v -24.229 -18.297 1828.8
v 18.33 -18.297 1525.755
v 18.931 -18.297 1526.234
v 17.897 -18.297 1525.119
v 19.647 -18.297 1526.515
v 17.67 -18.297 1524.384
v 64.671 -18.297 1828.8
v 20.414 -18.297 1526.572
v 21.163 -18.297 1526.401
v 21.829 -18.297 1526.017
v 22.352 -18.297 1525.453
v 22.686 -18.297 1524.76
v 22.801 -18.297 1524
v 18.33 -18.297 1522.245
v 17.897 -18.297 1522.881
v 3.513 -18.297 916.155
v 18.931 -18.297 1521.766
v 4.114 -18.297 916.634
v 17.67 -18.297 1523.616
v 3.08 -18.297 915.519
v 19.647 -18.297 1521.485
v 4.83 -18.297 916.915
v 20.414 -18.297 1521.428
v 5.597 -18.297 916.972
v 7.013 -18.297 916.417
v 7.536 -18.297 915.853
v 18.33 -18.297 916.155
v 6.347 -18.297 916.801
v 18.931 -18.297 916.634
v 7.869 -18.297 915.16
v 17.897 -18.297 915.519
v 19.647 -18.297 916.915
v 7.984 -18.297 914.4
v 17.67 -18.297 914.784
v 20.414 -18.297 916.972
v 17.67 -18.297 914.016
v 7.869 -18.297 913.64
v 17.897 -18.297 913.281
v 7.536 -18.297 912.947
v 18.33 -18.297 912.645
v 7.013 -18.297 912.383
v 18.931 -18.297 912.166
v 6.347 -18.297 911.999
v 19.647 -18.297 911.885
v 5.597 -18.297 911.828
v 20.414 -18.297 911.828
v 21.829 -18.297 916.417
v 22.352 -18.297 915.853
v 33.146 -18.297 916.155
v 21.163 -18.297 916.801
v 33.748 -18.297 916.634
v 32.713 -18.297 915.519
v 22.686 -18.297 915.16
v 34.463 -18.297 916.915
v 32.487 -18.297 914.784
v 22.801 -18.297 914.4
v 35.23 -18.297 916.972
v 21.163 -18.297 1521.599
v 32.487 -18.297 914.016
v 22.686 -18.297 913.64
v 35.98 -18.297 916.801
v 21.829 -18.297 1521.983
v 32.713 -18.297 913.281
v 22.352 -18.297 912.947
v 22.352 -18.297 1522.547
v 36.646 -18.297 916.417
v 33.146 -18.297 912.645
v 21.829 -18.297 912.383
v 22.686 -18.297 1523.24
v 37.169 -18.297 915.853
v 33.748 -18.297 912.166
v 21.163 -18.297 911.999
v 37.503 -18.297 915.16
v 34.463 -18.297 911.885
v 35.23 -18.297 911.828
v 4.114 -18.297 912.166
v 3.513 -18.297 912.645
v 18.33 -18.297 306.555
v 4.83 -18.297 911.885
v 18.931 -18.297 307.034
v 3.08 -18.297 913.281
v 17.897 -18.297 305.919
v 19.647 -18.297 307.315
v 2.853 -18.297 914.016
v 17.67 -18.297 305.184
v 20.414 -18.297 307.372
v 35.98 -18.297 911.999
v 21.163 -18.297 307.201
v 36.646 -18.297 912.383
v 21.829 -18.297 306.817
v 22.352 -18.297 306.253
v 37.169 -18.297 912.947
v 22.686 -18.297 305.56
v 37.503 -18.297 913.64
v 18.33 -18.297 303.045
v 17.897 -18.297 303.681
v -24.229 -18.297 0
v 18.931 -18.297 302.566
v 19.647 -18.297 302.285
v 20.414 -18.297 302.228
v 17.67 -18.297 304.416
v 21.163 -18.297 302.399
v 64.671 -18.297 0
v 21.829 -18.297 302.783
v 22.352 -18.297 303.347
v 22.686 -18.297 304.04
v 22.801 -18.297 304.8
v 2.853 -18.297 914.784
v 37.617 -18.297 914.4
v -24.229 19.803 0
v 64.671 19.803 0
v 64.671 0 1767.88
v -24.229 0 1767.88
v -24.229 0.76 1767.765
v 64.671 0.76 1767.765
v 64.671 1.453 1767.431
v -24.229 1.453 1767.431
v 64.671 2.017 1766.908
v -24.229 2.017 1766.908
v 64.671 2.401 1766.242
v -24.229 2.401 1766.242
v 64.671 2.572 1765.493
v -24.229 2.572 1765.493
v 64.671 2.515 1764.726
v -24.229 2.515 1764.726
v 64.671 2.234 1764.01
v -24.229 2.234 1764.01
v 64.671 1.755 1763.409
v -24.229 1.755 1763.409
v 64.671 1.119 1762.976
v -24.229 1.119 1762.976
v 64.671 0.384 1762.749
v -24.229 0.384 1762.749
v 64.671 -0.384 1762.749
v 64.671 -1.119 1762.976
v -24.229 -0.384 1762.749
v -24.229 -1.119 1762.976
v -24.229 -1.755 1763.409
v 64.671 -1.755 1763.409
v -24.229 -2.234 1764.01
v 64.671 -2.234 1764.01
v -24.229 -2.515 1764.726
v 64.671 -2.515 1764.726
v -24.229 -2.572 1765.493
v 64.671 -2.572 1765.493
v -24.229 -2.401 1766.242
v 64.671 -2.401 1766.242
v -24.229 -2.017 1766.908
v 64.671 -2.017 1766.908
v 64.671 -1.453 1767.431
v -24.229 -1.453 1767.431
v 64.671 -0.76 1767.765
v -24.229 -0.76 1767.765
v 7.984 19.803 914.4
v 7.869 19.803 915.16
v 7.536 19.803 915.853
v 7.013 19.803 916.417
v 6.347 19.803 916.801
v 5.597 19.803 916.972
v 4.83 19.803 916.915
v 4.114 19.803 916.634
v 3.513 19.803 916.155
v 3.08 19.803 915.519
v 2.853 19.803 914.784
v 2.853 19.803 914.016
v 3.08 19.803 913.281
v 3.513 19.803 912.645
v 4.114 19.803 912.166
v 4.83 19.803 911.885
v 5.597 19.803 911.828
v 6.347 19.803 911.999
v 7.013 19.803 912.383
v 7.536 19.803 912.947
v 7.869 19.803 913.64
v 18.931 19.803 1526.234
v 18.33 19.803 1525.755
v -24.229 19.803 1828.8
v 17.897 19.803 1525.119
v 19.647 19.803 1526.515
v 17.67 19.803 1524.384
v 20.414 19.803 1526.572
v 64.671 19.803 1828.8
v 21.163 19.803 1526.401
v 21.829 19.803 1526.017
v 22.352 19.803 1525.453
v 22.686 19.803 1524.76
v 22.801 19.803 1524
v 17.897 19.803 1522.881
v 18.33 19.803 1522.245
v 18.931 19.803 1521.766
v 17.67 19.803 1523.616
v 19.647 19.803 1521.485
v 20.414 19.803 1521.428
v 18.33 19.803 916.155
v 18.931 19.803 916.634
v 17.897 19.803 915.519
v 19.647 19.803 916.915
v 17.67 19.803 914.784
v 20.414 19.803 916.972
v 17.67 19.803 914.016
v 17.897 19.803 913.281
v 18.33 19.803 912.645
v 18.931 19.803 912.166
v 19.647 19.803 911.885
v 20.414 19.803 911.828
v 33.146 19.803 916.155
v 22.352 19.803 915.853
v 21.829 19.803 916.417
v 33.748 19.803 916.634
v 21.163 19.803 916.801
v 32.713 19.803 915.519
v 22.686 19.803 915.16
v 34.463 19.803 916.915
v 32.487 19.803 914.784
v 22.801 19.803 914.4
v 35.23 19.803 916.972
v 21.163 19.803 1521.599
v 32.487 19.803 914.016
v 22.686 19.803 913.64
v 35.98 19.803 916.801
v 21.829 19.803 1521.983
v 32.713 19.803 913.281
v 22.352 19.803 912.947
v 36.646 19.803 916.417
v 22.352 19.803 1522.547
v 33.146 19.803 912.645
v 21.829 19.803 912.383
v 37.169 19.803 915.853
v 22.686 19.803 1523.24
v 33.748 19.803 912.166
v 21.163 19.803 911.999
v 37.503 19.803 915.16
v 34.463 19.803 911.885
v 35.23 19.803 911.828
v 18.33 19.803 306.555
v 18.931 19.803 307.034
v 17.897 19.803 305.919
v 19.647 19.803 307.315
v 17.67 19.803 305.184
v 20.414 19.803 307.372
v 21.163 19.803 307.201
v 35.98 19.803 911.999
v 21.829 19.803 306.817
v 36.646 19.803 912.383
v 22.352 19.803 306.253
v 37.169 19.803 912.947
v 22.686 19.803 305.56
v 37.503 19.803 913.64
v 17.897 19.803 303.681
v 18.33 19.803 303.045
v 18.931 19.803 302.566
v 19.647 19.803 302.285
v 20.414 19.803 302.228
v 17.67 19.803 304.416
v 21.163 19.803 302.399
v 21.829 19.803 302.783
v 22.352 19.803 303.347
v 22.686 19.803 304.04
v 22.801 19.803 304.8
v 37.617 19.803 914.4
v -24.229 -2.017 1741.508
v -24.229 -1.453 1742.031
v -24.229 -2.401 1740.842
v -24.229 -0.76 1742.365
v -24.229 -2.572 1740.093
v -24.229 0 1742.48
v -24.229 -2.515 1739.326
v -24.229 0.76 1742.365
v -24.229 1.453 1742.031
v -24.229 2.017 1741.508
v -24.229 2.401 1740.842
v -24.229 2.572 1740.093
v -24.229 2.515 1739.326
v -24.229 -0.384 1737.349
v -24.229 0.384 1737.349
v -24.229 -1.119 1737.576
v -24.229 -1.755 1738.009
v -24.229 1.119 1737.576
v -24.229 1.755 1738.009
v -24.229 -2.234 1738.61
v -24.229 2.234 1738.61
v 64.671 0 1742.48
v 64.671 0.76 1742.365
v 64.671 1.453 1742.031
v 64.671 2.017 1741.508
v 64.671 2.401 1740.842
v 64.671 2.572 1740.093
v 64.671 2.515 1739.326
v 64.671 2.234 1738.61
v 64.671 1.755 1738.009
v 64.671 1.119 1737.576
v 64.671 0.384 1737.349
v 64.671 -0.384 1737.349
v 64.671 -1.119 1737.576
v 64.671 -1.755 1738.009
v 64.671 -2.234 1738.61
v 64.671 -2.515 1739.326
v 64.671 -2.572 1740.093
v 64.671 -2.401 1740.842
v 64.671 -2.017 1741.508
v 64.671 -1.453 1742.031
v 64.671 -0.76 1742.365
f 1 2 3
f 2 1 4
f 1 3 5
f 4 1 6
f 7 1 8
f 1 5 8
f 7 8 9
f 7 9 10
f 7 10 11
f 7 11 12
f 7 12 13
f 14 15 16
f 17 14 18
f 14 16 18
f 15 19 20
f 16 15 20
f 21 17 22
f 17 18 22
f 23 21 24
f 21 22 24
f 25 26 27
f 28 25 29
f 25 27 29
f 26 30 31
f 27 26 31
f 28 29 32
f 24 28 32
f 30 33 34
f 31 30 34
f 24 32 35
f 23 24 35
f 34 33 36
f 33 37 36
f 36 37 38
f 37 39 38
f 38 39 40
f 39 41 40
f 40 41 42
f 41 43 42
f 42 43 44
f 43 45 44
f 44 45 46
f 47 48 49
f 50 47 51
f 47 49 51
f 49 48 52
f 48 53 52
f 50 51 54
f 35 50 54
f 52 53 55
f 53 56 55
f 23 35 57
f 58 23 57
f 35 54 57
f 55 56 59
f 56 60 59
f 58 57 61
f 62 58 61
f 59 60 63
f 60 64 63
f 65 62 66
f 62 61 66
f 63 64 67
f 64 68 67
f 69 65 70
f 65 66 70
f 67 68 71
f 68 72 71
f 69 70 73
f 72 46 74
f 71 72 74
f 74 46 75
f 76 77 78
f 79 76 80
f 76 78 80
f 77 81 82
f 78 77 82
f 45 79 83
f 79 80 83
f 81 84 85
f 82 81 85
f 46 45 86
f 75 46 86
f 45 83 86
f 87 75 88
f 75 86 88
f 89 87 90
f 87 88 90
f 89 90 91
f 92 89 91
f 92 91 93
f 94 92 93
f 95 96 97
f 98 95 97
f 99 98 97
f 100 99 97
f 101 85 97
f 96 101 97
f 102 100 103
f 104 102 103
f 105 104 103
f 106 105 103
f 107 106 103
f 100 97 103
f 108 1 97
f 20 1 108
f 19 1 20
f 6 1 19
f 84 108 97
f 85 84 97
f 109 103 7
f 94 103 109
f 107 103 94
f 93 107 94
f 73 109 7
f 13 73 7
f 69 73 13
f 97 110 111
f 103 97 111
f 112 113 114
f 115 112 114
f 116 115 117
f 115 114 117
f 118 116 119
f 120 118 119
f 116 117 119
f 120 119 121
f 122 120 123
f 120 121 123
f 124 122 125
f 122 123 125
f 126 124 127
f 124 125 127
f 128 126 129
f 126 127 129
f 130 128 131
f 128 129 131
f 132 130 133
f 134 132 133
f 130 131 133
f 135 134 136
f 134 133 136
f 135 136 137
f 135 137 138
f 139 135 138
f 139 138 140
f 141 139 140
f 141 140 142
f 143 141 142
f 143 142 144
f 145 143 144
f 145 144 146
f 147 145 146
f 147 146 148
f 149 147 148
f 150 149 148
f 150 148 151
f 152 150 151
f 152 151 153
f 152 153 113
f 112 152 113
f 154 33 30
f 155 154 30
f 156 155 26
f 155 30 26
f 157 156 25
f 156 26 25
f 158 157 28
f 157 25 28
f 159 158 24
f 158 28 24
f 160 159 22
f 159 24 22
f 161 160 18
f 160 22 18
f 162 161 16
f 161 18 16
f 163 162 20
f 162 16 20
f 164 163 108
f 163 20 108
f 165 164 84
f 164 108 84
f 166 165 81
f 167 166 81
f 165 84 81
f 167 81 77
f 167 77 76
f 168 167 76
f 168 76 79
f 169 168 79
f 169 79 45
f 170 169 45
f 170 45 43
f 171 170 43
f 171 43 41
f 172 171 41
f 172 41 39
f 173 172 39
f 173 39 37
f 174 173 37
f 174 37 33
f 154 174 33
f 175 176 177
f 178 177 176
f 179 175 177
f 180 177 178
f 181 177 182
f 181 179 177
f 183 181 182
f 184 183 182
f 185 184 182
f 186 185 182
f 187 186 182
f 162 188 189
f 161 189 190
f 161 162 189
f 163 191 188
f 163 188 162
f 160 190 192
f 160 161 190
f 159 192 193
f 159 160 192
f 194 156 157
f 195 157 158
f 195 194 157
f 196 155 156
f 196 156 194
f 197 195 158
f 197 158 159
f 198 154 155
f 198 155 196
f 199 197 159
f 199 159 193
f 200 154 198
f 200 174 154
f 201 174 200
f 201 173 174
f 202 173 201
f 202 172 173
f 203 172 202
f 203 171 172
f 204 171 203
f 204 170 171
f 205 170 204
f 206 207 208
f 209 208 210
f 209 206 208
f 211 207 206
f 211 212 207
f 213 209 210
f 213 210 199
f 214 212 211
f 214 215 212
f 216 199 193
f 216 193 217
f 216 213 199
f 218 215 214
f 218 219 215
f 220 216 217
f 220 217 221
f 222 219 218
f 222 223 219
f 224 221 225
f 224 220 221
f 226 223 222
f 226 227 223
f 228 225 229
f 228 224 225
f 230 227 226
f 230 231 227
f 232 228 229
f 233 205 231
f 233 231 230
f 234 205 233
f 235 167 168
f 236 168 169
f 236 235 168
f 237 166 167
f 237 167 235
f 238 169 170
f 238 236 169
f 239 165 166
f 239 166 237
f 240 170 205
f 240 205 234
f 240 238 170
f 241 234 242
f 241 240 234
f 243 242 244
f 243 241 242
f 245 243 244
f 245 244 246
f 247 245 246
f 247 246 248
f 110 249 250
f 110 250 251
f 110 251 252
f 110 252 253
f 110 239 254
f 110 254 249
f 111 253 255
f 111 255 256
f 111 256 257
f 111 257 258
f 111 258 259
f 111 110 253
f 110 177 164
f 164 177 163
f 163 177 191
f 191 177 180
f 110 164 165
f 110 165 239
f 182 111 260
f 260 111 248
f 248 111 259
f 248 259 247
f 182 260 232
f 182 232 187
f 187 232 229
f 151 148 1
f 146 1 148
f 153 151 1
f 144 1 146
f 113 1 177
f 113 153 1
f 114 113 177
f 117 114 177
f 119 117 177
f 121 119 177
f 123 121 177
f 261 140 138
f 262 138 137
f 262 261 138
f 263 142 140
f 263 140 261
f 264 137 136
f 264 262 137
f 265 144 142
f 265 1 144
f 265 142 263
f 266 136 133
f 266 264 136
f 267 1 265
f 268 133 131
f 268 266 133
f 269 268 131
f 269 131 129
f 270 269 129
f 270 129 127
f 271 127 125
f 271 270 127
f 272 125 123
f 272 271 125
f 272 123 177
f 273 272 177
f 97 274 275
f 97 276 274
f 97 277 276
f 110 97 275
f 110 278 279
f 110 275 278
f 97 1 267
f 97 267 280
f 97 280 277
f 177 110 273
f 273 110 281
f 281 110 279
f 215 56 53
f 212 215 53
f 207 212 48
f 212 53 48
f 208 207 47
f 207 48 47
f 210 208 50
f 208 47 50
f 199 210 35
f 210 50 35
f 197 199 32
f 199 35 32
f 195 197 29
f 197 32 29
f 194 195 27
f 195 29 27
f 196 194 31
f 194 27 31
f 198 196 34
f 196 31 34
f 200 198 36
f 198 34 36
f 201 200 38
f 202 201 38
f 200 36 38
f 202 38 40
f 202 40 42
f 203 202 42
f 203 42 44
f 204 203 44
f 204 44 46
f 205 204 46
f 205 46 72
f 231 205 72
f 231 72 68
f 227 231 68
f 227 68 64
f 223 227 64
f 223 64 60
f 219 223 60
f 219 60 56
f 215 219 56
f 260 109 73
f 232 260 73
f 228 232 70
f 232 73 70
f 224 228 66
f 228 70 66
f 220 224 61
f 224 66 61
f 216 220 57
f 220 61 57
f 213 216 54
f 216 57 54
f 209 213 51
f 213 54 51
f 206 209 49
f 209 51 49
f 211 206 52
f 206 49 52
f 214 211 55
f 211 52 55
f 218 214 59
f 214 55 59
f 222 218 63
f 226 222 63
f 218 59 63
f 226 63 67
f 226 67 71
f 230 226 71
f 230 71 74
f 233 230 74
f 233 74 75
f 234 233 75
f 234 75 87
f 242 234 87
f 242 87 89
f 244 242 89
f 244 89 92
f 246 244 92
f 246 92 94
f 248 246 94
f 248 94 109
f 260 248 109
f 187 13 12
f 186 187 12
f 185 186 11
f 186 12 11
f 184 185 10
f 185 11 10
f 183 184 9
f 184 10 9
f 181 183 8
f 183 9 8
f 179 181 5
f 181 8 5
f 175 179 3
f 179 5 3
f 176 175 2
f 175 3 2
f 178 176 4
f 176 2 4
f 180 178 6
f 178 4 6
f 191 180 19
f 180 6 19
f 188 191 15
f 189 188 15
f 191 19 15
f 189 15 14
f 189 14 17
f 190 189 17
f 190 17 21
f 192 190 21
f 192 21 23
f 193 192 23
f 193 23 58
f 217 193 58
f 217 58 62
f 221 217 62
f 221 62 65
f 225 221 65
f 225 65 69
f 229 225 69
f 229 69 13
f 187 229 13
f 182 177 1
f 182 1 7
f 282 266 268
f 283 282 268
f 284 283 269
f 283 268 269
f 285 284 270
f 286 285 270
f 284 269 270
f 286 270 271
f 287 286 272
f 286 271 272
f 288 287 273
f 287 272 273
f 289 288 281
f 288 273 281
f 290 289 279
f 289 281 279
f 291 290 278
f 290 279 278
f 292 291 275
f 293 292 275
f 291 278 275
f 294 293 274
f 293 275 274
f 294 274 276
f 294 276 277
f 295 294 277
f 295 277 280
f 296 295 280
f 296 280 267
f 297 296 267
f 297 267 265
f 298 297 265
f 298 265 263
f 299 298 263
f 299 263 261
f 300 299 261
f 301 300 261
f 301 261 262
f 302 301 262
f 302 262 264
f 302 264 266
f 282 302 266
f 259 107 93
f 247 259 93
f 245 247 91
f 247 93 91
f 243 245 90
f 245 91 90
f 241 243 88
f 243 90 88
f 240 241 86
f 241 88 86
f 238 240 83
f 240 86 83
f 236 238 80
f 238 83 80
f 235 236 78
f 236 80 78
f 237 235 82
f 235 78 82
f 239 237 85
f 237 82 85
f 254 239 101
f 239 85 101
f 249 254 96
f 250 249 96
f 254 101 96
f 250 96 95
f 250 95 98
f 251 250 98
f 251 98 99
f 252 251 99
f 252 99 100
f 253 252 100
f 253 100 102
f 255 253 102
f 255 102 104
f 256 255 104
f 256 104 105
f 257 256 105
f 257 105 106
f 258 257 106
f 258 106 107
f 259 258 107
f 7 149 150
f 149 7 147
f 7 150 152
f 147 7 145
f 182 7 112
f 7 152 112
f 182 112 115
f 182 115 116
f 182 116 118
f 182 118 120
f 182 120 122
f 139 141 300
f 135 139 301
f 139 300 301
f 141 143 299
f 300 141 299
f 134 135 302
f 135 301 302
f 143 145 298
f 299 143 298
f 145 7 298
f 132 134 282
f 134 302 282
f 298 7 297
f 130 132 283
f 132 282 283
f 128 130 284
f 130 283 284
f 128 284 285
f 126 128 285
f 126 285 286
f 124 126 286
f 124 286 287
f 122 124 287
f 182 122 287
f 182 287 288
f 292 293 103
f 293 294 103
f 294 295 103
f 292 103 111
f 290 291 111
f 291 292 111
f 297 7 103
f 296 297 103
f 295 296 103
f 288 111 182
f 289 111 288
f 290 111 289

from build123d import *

# Parameters (mm, degrees)
SKETCH1_W           = 88.9
SKETCH1_H           = 38.1
BOSS_EXTRUDE1_DEPTH = 1828.8
SKETCH2_R           = 2.5796875
CUT_EXTRUDE1_DEPTH  = 89.9
SKETCH3_R           = 2.5796875
CUT_EXTRUDE2_DEPTH  = 39.1
SKETCH4_R           = 2.5796875
CUT_EXTRUDE3_DEPTH  = 39.1


with BuildPart() as part:
    # Sketch1 → Boss-Extrude1 (new body)
    with BuildSketch(Plane.XY):
        with Locations((20.220860341, 0.753389831)):
            Rectangle(SKETCH1_W, SKETCH1_H)
    extrude(amount=BOSS_EXTRUDE1_DEPTH)

    # Sketch2 → Cut-Extrude1 (cut, through all)
    with BuildSketch(Plane.ZY.offset(24.229139659)):
        with Locations((1739.9, 0)):
            Circle(SKETCH2_R)
        with Locations((1765.3, 0)):
            Circle(SKETCH2_R)
    extrude(amount=-CUT_EXTRUDE1_DEPTH, mode=Mode.SUBTRACT)

    # Sketch3 → Cut-Extrude2 (cut, through all)
    with BuildSketch(Plane.XZ.offset(18.296610169)):
        with Locations((35.037527007, 914.4)):
            Circle(SKETCH3_R)
        with Locations((5.404193674, 914.4)):
            Circle(SKETCH3_R)
    extrude(amount=-CUT_EXTRUDE2_DEPTH, mode=Mode.SUBTRACT)

    # Sketch4 → Cut-Extrude3 (cut, through all)
    with BuildSketch(Plane.XZ.offset(18.296610169)):
        with Locations((20.220860341, 1524)):
            Circle(SKETCH4_R)
        with Locations((20.220860341, 914.4)):
            Circle(SKETCH4_R)
        with Locations((20.220860341, 304.8)):
            Circle(SKETCH4_R)
    extrude(amount=-CUT_EXTRUDE3_DEPTH, mode=Mode.SUBTRACT)


solid = part.part
